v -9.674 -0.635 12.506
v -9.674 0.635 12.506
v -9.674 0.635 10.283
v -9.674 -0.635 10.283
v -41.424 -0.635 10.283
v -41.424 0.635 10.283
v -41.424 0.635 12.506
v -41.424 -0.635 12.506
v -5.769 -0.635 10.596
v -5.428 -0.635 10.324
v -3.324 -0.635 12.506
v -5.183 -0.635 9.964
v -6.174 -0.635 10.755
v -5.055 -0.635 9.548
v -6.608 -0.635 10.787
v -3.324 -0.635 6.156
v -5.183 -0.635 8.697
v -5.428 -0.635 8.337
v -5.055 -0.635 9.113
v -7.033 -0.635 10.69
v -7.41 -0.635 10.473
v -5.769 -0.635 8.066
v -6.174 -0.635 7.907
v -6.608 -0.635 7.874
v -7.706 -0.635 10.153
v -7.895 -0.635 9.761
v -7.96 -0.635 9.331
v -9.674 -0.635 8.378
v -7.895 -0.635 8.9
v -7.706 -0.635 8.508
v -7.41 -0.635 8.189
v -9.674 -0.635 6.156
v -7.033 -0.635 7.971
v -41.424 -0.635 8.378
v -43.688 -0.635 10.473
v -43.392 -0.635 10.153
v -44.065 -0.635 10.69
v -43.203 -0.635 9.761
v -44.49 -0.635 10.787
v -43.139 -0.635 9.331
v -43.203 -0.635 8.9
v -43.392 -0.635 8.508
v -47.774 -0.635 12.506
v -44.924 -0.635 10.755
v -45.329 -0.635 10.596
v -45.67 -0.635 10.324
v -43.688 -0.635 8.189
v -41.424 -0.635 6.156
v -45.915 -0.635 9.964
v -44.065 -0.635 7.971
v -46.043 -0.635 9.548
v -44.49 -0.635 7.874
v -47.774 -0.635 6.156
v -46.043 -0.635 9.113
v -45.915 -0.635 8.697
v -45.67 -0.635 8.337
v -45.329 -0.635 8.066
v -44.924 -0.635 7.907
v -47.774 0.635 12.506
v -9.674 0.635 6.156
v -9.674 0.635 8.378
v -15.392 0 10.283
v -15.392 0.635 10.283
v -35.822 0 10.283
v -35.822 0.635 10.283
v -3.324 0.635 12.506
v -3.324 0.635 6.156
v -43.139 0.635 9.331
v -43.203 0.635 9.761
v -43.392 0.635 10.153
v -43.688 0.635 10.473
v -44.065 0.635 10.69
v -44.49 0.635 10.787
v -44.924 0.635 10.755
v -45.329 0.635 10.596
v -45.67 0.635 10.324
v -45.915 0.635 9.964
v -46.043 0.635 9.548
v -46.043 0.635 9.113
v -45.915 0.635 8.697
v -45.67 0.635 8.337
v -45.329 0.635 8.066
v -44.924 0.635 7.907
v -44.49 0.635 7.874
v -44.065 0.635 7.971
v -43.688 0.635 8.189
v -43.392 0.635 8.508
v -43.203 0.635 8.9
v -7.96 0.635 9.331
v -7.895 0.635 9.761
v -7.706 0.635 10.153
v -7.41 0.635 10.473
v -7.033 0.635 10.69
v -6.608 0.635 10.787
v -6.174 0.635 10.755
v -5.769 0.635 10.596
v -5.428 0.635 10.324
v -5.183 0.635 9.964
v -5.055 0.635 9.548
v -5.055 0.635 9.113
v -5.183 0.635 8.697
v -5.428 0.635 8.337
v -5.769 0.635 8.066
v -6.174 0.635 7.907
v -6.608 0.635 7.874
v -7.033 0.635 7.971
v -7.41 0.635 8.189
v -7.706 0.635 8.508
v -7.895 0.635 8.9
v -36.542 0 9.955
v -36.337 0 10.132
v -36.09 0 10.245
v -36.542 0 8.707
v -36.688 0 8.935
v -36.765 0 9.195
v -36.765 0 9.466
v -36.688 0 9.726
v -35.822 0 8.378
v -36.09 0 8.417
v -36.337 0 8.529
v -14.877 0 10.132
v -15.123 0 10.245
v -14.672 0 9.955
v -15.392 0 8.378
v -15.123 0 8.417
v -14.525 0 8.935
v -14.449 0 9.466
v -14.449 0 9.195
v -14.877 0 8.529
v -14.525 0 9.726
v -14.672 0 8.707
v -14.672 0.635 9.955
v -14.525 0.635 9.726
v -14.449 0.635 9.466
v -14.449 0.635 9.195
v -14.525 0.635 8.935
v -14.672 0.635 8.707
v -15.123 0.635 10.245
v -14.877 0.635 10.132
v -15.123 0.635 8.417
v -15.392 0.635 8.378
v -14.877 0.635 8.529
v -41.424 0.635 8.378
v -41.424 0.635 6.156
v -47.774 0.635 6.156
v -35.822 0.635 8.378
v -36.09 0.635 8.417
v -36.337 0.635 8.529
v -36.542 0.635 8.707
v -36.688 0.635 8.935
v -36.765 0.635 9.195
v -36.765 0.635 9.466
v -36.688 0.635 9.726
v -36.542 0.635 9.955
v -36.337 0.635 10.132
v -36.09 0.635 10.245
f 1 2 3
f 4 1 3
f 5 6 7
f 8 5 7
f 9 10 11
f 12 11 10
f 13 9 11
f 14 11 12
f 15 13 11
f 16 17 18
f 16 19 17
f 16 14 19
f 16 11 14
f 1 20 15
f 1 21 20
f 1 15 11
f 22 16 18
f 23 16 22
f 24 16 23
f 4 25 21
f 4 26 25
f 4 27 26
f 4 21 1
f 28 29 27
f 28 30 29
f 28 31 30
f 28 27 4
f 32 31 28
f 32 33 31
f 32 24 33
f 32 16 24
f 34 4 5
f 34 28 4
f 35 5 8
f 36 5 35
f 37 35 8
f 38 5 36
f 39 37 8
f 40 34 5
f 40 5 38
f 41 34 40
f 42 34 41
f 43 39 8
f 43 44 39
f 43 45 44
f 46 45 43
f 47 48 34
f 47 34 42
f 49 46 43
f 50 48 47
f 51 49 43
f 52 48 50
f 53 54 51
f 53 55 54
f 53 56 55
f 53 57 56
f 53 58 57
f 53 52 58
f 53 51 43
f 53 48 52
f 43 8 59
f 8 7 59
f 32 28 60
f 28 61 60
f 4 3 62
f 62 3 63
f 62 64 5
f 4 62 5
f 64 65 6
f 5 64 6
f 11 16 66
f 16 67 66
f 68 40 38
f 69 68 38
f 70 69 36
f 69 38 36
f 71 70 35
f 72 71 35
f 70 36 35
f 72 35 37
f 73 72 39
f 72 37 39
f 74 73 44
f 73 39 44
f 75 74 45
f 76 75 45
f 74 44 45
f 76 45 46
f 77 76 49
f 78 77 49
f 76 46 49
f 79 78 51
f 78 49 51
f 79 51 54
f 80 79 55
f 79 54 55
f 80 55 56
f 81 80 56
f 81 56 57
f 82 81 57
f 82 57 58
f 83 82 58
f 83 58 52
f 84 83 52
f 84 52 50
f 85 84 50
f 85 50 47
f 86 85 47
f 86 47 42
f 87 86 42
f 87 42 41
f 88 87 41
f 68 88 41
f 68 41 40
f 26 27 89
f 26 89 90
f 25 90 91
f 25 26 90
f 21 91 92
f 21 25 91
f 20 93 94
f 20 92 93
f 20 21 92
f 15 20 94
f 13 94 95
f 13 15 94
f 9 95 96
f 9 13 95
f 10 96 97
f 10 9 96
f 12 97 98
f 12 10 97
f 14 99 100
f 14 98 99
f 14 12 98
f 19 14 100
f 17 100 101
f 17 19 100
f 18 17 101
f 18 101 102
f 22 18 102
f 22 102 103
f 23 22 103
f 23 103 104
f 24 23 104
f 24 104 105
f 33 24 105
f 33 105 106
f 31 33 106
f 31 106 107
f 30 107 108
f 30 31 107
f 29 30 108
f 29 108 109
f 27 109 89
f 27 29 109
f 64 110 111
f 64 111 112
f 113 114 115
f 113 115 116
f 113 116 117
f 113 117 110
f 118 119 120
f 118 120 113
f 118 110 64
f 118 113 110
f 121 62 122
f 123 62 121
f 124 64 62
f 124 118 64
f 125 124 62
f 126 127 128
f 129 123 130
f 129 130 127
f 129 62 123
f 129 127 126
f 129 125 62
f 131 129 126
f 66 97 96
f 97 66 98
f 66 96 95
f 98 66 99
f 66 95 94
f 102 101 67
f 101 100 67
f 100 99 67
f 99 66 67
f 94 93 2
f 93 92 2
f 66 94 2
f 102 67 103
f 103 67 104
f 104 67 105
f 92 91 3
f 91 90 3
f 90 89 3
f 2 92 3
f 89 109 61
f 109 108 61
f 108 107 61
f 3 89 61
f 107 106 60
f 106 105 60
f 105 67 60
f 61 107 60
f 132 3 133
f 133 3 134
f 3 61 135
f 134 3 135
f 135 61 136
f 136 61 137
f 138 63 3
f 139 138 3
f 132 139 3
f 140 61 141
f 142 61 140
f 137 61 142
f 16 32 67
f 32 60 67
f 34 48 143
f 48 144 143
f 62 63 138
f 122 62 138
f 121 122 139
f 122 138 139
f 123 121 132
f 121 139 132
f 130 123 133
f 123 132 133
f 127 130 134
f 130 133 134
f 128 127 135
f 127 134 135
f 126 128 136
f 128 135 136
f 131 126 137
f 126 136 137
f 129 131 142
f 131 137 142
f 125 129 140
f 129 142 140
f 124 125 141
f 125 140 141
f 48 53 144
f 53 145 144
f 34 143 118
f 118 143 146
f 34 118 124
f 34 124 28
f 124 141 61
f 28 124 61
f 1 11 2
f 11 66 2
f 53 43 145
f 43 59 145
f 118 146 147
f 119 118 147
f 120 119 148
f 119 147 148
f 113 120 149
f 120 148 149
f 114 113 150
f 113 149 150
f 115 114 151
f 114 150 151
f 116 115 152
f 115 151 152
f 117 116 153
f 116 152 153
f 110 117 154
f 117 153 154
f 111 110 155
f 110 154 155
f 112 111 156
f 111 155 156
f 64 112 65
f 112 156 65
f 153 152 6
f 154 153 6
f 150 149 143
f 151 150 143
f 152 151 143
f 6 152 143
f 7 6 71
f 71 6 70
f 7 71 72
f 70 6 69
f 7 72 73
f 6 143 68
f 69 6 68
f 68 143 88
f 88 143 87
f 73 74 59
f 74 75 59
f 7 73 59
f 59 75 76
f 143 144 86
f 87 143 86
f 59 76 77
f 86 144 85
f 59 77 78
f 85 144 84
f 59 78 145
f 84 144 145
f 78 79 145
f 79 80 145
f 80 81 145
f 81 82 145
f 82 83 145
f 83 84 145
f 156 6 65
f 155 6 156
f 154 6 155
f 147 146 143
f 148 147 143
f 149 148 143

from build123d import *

# Parameters (mm, degrees)
BOSS_EXTRUDE1_DEPTH          = 0.635
F_97_0_0059_DIAMETER_HOLE1_D = 2.921
CUT_EXTRUDE8_DEPTH           = 0.635


with BuildPart() as part:
    # Sketch1 → Boss-Extrude1 (new, symmetric)
    with BuildSketch(Plane(origin=(0, 0, 0), x_dir=(1, 0, 0), z_dir=(0, 1, 0))):
        Polygon((-41.424046485, -10.283259465), (-41.424046485, -12.505759465), (-47.774046485, -12.505759465), (-47.774046485, -6.155759465), (-41.424046485, -6.155759465), (-41.424046485, -8.378259465), (-9.674046485, -8.378259465), (-9.674046485, -6.155759465), (-3.324046485, -6.155759465), (-3.324046485, -12.505759465), (-9.674046485, -12.505759465), (-9.674046485, -10.283259465), align=None)
    extrude(amount=BOSS_EXTRUDE1_DEPTH, both=True)

    # #97 (0.0059) Diameter Hole1 (through all)
    with Locations(Plane(origin=(0, 0.635, 0), x_dir=(-1, 0, 0), z_dir=(0, 1, 0))):
        with Locations((44.599046485, 9.330759465)):
            f_97_0_0059_diameter_hole1 = Hole(F_97_0_0059_DIAMETER_HOLE1_D / 2)

    # Mirror1: #97 (0.0059) Diameter Hole1 across plane
    add(f_97_0_0059_diameter_hole1.mirror(Plane(origin=(-25.549046485, 0, 0), x_dir=(0, 0, 1), z_dir=(1, 0, 0))), mode=Mode.SUBTRACT)

    # Sketch5 → Cut-Extrude8 (cut)
    with BuildSketch(Plane(origin=(0, 0.635, 0), x_dir=(1, 0, 0), z_dir=(0, 1, 0))):
        with BuildLine():
            Line((-15.39166679, -8.378259465), (-35.821920417, -8.378259465))
            ThreePointArc((-35.821920417, -8.378259465), (-36.774420417, -9.330759465), (-35.821920417, -10.283259465))
            Line((-35.821920417, -10.283259465), (-15.39166679, -10.283259465))
            ThreePointArc((-15.39166679, -10.283259465), (-14.43916679, -9.330759465), (-15.39166679, -8.378259465))
        make_face()
    extrude(amount=-CUT_EXTRUDE8_DEPTH, mode=Mode.SUBTRACT)


solid = part.part
